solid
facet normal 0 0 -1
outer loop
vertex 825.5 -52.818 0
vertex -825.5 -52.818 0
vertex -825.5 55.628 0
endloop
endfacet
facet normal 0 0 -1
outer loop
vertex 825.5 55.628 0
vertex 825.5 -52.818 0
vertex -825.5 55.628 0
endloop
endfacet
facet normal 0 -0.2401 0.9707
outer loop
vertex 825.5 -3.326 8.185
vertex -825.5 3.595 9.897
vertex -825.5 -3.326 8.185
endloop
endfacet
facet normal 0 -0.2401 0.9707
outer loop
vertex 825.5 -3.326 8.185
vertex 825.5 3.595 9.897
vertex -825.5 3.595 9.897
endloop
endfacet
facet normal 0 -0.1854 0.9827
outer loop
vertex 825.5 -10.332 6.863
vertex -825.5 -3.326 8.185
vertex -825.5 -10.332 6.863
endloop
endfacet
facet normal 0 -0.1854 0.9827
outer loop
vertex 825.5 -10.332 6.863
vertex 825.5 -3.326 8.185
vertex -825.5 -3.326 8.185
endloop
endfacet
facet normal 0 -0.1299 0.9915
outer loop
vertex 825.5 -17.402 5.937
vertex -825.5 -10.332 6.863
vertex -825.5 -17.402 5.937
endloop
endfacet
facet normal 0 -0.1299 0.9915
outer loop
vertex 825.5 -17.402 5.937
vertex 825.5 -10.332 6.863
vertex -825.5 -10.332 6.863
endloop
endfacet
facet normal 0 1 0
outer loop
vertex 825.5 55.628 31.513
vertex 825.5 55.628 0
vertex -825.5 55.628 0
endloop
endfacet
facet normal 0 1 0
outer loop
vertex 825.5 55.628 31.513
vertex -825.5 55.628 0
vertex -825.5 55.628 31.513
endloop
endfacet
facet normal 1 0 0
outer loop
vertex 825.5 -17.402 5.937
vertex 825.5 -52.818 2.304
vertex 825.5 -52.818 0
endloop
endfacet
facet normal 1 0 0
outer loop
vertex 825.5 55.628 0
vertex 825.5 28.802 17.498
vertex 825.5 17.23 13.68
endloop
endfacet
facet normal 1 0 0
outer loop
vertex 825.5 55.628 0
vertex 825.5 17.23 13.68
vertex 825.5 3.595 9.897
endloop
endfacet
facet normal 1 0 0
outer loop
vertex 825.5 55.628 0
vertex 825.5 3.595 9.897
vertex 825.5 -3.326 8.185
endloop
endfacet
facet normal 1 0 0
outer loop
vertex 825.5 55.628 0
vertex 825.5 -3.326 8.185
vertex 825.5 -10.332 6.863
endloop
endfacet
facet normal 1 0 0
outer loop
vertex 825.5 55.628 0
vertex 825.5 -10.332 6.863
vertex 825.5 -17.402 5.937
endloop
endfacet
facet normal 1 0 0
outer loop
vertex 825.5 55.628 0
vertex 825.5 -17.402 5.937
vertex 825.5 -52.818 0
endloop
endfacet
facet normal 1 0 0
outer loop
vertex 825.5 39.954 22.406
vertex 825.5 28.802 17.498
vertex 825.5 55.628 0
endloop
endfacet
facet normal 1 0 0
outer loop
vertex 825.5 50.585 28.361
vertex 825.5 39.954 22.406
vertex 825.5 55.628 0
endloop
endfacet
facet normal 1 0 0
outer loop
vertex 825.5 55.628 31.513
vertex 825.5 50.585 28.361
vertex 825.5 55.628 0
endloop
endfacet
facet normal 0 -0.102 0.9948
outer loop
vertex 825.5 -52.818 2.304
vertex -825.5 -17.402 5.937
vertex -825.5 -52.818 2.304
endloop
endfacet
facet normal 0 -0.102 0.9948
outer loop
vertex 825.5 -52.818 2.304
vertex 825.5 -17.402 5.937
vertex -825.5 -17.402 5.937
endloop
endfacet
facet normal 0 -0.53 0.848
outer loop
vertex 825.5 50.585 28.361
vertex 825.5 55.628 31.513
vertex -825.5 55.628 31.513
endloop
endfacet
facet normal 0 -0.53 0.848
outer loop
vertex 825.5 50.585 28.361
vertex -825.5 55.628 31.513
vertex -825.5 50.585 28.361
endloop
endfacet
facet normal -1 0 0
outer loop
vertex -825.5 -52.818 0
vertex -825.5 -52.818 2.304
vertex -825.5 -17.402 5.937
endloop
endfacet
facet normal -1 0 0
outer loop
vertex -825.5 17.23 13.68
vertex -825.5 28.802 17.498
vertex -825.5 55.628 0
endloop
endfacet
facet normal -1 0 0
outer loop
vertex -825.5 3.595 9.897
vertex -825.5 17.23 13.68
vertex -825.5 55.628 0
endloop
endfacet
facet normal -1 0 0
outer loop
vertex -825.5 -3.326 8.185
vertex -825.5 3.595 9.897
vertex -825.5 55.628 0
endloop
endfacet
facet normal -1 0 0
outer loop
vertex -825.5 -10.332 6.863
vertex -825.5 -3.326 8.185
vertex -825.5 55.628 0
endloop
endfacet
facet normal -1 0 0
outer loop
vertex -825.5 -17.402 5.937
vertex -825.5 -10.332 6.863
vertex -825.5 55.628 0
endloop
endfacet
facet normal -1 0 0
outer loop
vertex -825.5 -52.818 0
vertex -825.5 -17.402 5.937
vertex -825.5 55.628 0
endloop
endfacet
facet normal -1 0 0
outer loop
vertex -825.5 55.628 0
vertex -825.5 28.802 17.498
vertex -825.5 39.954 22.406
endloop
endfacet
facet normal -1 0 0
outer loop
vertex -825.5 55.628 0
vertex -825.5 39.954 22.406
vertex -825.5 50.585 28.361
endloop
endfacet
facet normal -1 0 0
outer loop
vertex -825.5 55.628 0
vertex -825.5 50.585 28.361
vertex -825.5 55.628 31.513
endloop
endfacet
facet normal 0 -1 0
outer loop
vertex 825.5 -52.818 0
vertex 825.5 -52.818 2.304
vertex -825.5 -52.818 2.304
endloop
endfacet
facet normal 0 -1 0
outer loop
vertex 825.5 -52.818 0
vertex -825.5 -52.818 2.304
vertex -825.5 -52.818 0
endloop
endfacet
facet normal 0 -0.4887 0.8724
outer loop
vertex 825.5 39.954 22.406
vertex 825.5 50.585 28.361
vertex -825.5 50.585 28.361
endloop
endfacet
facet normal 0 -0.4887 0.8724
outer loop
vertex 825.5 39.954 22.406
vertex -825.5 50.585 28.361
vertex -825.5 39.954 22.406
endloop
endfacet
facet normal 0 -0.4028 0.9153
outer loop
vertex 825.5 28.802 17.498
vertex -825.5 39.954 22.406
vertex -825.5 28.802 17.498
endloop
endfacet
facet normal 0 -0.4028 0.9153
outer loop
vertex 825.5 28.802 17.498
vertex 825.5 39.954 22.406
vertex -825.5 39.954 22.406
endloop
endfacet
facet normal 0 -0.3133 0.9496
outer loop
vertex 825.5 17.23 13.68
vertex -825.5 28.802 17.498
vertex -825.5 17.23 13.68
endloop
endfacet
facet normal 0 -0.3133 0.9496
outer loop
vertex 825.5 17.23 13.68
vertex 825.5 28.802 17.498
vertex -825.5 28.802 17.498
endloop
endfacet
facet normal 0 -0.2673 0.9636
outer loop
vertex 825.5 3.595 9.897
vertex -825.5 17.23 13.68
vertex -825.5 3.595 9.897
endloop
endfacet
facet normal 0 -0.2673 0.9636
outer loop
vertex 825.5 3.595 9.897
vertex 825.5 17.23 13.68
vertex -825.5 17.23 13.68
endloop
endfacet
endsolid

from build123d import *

# Parameters (mm, degrees)
F1_DEPTH = 825.5


with BuildPart() as f1:
    # F0 (on Right) → F1 (new body, symmetric)
    with BuildSketch(Plane.YZ):
        with BuildLine():
            Line((-17.4017421393, 5.936837718), (-52.8176613152, 2.3044354748))
            Line((-52.8176613152, 2.3044354748), (-52.8176613152, 0))
            Line((-52.8176613152, 0), (55.627758292, 0))
            Line((55.627758292, 0), (55.627758292, 31.5129175921))
            Line((55.627758292, 31.5129175921), (50.5852726164, 28.3613643292))
            ThreePointArc((50.5852726164, 28.3613643292), (34.4368278859, 19.8181329), (17.22969466, 13.6802475466))
            Line((17.22969466, 13.6802475466), (3.594874024, 9.8971762013))
            ThreePointArc((3.594874024, 9.8971762013), (-6.8199988392, 7.474656574), (-17.4017421393, 5.936837718))
        make_face()
    extrude(amount=F1_DEPTH, both=True)


solid = f1.part
